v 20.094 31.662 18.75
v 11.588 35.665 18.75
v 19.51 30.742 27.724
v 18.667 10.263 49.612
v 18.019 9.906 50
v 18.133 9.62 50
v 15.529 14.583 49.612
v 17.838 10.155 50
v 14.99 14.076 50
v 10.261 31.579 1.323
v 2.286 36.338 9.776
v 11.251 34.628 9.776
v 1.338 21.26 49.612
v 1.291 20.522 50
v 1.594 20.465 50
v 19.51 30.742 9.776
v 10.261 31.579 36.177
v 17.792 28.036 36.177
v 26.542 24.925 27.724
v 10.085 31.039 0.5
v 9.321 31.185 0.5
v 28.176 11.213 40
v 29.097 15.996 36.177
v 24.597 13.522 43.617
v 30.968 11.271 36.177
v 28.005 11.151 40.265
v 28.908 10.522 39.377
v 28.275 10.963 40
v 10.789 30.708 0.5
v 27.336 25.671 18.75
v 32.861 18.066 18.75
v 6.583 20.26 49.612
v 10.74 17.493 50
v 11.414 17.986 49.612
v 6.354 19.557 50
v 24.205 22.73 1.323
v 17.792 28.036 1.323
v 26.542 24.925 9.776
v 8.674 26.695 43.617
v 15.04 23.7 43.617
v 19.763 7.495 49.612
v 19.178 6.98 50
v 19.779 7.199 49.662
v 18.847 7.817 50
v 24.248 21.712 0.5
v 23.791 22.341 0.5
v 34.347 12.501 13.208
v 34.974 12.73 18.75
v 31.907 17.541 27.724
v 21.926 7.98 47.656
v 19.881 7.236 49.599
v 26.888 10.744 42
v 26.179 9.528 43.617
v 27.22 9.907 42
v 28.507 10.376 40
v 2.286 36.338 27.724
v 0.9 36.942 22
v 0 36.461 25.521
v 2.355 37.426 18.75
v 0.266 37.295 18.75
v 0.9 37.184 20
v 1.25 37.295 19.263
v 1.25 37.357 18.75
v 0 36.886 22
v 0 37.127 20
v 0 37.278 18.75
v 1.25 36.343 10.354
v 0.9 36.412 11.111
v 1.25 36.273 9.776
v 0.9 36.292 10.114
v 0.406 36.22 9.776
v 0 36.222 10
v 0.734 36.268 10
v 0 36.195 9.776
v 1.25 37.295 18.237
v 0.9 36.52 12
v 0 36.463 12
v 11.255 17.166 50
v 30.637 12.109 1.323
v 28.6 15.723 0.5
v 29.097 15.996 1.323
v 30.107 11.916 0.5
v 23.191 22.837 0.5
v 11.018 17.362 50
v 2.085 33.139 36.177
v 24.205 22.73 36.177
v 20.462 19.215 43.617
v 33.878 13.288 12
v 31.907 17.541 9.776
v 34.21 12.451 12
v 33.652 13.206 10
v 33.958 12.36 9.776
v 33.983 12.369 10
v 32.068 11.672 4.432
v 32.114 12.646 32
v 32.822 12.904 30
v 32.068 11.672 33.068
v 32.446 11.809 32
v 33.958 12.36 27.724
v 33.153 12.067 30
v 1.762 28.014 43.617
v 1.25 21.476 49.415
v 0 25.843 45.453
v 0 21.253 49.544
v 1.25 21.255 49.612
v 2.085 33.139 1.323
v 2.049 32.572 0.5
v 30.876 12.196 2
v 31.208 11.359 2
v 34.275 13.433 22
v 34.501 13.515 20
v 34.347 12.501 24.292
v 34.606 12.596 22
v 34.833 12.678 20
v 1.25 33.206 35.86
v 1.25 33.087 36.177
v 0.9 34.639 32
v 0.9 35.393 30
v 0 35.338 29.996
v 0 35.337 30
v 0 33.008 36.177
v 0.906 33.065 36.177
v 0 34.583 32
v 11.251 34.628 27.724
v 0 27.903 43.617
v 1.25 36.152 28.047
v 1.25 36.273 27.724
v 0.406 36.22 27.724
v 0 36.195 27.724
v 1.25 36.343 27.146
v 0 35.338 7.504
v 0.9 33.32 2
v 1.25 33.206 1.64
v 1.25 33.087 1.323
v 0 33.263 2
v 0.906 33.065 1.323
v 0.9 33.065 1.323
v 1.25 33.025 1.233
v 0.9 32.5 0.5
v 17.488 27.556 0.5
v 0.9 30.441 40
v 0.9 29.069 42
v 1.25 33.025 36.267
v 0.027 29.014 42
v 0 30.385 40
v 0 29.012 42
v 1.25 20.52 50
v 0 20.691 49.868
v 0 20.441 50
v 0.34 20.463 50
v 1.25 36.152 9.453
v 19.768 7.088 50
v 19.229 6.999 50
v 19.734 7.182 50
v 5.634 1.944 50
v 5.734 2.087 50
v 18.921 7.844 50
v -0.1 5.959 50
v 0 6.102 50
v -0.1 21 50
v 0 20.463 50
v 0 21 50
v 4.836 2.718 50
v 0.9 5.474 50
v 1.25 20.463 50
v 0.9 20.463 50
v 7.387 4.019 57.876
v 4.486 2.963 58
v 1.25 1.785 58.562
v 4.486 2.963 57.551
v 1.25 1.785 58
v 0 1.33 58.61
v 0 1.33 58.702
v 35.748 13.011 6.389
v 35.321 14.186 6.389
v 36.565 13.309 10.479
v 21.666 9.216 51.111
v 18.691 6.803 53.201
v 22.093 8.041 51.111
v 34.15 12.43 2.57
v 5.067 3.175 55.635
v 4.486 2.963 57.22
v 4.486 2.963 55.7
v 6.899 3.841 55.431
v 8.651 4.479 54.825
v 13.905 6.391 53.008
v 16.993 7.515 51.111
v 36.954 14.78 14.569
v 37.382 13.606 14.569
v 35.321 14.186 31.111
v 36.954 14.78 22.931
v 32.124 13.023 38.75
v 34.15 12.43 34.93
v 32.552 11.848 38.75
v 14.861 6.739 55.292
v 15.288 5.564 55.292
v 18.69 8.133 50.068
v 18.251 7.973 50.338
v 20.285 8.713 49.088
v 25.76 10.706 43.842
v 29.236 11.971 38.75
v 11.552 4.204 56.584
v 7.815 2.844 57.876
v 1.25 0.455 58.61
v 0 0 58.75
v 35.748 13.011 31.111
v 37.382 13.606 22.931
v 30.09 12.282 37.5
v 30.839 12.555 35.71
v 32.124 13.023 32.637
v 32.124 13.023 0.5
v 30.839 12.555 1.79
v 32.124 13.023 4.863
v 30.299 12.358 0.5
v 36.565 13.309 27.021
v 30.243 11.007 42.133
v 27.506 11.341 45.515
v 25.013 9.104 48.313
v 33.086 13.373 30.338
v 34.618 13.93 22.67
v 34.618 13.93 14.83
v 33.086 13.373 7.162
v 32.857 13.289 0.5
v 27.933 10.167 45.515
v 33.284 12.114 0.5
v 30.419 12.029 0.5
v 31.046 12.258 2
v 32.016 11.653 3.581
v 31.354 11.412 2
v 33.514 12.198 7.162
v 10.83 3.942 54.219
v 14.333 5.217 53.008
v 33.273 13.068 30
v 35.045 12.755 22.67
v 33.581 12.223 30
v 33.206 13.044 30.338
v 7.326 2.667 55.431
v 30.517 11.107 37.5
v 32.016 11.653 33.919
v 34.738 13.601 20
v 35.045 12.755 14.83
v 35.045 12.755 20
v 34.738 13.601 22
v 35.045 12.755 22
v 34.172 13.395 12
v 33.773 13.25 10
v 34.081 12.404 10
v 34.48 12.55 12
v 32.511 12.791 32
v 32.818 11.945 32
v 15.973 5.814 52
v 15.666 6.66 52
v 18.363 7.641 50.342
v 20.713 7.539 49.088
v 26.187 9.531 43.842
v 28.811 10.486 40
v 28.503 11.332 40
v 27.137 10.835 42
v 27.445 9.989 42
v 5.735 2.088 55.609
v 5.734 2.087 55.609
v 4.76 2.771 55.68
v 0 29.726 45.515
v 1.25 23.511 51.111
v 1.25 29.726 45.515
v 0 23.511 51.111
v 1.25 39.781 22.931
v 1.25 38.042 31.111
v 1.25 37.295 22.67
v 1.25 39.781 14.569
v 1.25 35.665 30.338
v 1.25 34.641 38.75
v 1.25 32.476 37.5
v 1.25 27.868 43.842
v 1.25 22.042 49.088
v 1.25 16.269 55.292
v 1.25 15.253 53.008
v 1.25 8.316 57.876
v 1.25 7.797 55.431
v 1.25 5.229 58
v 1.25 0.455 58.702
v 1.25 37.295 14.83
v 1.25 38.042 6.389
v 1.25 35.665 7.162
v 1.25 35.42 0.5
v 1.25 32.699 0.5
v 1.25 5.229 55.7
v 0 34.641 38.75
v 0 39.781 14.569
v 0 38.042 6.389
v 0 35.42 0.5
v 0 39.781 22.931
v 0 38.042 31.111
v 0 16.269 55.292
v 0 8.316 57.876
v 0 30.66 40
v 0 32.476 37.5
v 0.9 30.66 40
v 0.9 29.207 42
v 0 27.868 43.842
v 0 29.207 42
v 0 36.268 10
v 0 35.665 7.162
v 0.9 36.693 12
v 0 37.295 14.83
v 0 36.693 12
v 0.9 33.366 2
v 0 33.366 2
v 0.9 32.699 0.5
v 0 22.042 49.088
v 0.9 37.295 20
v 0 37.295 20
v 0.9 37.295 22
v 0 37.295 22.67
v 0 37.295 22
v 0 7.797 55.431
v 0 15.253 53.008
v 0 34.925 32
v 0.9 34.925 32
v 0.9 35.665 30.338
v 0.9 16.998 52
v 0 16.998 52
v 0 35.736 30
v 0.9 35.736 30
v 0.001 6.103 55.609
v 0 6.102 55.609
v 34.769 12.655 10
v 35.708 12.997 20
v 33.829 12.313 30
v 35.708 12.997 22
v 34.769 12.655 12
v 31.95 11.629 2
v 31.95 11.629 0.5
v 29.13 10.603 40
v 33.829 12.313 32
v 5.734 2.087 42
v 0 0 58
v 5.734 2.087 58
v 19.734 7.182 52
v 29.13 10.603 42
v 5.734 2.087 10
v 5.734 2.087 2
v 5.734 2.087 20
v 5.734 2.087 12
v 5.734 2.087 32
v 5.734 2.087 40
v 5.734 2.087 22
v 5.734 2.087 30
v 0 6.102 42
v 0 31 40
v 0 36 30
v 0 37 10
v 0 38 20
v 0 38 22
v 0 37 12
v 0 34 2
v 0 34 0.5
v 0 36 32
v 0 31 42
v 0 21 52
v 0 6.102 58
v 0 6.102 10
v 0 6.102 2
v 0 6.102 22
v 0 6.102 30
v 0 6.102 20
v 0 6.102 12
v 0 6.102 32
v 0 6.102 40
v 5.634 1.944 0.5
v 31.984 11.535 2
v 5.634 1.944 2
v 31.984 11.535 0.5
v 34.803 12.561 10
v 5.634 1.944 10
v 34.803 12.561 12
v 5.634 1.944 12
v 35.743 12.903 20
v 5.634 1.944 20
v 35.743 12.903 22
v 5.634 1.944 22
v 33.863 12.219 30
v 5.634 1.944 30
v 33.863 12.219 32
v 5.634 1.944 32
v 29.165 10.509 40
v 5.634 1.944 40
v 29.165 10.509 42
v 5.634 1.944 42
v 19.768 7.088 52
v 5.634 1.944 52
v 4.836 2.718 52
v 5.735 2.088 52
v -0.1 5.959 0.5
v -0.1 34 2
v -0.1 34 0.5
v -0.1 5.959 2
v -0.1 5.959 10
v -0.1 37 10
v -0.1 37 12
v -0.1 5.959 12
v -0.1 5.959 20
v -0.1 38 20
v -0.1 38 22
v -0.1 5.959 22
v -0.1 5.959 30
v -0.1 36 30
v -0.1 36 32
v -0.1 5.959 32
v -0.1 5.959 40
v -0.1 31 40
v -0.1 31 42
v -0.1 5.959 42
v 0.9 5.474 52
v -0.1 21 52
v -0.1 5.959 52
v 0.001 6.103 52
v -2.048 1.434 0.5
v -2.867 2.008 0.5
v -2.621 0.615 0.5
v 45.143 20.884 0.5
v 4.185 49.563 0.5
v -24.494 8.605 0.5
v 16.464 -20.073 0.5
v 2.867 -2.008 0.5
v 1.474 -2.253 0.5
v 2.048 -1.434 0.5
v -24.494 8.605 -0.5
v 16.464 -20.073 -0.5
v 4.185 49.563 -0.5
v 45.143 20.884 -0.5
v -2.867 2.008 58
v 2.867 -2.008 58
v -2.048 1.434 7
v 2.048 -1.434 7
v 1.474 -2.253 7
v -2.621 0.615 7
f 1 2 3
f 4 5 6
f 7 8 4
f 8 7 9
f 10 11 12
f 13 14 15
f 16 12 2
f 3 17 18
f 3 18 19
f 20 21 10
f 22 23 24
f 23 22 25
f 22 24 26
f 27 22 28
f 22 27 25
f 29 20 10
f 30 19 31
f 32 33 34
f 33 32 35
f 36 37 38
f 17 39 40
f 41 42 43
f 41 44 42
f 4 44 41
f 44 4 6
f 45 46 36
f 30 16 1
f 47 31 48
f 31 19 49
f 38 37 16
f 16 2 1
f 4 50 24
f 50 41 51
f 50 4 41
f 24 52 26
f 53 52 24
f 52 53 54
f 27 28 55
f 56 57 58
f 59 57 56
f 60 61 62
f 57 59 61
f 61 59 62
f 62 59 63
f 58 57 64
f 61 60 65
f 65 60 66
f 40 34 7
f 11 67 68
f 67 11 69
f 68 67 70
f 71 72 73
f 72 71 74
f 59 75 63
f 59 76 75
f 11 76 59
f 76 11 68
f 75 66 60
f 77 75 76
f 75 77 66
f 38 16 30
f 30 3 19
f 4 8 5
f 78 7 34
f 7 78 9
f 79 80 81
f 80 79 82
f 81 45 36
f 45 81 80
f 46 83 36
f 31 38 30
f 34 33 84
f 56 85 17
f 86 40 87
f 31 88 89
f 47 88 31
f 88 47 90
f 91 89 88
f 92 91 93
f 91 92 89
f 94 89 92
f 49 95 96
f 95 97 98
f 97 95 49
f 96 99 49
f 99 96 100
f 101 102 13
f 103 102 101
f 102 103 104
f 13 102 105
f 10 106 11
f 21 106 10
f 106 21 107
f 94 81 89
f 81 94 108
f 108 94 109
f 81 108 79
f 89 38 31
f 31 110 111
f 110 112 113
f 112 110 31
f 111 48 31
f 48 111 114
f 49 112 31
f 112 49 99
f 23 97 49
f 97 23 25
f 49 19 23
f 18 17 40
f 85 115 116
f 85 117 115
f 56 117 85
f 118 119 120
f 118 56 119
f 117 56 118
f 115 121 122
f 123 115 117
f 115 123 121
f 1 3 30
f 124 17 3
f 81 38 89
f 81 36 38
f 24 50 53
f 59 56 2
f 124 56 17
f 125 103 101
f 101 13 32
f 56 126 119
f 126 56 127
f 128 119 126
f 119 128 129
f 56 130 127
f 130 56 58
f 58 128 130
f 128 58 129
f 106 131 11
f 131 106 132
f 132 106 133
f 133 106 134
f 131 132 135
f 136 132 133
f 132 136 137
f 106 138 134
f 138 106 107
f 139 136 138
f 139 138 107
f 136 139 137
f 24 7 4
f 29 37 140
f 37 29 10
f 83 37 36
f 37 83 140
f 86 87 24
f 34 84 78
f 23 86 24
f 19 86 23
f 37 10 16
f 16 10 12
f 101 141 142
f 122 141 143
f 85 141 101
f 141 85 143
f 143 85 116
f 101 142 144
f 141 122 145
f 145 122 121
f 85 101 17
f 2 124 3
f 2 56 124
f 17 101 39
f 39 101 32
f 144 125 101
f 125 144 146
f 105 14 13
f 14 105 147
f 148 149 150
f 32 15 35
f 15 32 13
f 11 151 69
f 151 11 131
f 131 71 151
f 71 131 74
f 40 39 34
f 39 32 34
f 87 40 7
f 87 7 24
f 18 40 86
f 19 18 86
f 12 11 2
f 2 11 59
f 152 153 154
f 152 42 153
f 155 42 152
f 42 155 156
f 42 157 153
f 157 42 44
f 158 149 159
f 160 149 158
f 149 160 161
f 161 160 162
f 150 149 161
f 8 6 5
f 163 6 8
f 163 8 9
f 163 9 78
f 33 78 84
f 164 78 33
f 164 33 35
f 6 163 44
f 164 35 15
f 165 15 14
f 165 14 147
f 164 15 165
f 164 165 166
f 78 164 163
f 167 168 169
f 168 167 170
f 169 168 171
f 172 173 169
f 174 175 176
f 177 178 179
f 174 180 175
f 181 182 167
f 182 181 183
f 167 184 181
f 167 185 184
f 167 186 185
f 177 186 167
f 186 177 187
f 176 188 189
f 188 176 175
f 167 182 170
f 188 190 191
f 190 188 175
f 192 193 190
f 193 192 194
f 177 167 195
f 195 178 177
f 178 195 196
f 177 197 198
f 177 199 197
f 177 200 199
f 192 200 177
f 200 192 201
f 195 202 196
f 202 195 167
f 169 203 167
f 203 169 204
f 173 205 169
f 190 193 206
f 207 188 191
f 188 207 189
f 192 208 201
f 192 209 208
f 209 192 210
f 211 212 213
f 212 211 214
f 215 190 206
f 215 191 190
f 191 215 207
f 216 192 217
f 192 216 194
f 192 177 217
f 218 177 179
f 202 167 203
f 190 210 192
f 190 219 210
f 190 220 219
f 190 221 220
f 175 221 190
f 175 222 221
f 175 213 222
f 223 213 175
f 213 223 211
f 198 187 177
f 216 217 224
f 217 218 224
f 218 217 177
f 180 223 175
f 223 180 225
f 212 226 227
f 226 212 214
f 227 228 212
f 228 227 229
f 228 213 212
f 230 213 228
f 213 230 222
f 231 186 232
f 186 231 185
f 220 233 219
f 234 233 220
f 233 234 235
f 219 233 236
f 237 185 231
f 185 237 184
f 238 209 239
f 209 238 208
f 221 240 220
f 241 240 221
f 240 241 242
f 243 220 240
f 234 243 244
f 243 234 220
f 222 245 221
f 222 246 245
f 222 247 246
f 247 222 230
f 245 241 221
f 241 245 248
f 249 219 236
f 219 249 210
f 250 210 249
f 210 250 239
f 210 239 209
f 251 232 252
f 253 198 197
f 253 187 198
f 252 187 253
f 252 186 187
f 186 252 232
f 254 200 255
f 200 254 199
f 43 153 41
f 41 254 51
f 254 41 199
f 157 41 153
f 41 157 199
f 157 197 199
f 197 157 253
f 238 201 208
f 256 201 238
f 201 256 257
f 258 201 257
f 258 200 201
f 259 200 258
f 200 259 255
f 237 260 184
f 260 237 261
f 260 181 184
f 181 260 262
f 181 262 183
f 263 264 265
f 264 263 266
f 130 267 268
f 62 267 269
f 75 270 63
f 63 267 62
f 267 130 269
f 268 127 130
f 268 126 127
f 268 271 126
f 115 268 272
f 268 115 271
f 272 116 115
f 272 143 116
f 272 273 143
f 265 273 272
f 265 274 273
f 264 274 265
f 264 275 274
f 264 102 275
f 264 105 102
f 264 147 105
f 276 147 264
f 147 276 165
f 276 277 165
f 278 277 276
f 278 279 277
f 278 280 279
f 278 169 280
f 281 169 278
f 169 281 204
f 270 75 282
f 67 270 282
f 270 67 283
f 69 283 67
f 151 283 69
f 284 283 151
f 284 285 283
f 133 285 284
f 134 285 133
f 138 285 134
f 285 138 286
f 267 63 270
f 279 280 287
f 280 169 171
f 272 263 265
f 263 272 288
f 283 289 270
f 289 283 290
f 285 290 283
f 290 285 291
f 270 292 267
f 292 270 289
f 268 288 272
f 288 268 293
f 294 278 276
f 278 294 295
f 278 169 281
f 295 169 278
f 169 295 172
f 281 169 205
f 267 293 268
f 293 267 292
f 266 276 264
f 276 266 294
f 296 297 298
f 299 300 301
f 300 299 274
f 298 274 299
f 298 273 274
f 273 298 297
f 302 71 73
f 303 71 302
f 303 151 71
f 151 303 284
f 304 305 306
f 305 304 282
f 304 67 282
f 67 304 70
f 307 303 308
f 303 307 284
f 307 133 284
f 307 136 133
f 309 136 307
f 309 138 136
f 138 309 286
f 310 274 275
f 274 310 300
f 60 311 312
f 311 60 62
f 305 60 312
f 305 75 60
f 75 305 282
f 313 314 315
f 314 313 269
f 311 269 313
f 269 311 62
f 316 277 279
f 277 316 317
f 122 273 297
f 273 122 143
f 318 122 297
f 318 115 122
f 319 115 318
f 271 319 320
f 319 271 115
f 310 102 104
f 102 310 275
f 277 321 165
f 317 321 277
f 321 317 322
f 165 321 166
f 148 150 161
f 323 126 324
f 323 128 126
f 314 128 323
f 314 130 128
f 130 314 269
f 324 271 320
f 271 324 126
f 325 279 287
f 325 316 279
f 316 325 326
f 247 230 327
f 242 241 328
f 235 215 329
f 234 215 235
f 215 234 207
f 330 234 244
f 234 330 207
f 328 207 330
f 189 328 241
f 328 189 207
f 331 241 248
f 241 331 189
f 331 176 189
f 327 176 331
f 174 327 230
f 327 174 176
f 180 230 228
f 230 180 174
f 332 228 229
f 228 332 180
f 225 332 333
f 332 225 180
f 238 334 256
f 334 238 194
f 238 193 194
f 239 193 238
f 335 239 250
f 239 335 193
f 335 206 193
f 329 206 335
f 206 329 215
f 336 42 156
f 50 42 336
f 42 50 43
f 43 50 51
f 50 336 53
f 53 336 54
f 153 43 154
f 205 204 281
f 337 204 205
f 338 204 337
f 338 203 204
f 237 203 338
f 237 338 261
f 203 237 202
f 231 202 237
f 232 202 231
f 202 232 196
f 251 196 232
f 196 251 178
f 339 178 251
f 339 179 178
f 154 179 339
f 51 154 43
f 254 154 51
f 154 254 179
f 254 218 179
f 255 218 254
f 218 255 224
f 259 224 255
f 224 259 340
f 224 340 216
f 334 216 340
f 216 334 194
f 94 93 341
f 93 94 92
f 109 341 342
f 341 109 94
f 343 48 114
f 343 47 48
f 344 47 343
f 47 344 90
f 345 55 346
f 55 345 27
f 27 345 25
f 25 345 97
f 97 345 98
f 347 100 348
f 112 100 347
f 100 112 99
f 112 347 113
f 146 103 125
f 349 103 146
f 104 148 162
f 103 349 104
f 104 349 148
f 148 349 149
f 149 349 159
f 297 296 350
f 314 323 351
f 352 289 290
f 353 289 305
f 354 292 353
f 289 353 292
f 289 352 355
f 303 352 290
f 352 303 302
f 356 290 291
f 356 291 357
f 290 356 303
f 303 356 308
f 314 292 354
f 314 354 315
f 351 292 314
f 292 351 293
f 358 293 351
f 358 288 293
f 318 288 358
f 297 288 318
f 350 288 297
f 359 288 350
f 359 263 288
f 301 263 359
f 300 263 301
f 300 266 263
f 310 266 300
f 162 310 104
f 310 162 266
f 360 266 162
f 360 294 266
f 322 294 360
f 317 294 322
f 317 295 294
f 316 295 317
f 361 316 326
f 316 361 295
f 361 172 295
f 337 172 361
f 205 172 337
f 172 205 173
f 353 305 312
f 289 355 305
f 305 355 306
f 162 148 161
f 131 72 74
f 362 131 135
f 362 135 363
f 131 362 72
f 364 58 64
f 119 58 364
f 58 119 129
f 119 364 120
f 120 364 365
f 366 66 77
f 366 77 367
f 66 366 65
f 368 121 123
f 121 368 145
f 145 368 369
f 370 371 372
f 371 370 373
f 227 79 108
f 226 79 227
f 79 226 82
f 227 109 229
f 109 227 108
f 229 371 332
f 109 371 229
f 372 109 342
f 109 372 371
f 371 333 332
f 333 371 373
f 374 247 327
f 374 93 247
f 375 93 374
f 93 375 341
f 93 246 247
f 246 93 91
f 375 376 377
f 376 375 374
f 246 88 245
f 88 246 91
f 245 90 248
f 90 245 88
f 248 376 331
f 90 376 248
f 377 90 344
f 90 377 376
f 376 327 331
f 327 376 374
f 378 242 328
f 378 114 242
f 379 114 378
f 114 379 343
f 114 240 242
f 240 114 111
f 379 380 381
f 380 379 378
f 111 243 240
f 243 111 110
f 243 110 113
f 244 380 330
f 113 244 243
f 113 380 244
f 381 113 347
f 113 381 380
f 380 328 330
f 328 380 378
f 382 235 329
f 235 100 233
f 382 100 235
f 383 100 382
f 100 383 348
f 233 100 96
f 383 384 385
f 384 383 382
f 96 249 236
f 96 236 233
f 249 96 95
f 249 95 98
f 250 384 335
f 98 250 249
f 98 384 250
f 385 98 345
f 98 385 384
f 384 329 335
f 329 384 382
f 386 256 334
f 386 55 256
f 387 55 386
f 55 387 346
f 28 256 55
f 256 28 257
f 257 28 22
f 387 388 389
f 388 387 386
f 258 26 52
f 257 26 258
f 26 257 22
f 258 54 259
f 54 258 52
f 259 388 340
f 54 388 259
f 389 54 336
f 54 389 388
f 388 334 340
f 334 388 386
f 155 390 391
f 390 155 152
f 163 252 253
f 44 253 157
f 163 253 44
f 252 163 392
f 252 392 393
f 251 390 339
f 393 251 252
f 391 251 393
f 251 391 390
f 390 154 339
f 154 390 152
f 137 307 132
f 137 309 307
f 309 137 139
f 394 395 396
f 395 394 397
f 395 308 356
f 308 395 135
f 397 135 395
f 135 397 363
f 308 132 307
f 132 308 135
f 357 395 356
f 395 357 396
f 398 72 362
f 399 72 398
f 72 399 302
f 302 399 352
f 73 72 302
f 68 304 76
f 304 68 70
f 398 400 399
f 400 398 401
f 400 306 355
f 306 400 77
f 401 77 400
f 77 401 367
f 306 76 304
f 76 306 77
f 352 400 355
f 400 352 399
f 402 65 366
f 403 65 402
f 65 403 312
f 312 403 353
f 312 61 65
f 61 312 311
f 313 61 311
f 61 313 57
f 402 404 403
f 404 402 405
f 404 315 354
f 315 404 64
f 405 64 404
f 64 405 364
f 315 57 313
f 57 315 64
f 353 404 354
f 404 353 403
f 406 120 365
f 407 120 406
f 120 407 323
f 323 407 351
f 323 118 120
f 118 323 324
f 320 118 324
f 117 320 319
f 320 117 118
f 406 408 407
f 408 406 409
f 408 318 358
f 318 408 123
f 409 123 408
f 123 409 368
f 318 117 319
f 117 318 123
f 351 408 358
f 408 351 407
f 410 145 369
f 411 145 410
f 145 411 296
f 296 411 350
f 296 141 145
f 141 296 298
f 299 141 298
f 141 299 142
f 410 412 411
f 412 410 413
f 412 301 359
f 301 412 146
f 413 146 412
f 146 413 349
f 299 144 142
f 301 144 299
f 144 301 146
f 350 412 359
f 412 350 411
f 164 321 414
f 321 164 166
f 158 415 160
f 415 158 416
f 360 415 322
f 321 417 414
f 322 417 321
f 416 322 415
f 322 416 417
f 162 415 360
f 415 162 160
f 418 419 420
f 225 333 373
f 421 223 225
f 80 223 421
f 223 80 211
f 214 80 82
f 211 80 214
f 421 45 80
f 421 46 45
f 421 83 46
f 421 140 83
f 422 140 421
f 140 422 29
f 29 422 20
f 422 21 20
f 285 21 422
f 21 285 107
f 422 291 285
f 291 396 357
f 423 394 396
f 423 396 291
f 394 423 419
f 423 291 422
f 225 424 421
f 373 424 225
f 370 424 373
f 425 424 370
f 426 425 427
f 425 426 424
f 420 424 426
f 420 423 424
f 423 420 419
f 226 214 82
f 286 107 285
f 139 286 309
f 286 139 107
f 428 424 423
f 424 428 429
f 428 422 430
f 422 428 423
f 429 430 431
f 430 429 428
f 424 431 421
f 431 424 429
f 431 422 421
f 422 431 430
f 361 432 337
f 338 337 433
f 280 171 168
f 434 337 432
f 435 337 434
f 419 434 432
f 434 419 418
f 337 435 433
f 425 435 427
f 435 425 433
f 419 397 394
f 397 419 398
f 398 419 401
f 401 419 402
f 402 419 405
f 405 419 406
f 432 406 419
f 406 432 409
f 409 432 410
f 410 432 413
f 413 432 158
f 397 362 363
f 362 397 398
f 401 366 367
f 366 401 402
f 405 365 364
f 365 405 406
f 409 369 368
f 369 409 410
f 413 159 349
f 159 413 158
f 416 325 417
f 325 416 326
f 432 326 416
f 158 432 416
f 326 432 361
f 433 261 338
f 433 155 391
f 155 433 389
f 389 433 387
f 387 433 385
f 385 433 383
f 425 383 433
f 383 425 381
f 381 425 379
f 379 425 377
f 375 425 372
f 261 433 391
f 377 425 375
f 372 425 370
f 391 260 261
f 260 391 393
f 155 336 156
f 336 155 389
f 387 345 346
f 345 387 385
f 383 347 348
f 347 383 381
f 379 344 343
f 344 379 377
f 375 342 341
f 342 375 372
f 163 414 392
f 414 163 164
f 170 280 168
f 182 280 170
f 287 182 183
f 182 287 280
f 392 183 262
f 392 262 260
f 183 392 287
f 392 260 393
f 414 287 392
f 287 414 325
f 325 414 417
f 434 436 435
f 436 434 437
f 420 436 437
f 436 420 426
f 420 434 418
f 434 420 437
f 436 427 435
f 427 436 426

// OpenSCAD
sphere_radius=30;
boundry_wall_radius=sphere_radius+2;

cube_side=100;

scale_by=1.25;

//40x40x57


scale([scale_by,scale_by,scale_by]){
difference(){
	
	union(){

		difference(){
			translate([0,0,15])
				sphere(r=sphere_radius,$fn=25);

			translate([cube_side/-2,cube_side/-2,sphere_radius*5/6+15])
				color("red")		// above the roof
					cube([cube_side,cube_side,cube_side]);
		}

		difference(){
			rotate([90,90,20])
				translate([-15,0,0])
					color("white")
						cylinder(r=boundry_wall_radius,h=2,center=true);
			rotate([90,90,20])
				translate([-15,0,0])
					color("white")
						cylinder(r=boundry_wall_radius-2,h=4,center=true);
		}

		difference(){
			rotate([90,90,90])
				translate([-15,0,0])
					color("purple")
						cylinder(r=boundry_wall_radius,h=2,center=true);
			rotate([90,90,90])
				translate([-15,0,0])
					color("purple")
						cylinder(r=boundry_wall_radius-2,h=4,center=true);
		}
	}

	union(){		
		rotate([0,0,20])
			translate([0,cube_side/-2,0])
				color("blue")
					cube([cube_side,cube_side,cube_side],center=true);

		rotate([0,0,0])
			translate([cube_side/-2,0,0])
				color("blue")
					cube([cube_side,cube_side,cube_side],center=true);

		translate([cube_side/-2,cube_side/-2,-cube_side])
			color("red")		// Below the ground
				cube([cube_side,cube_side,cube_side]);


	}
}

}

		color("green")
			rotate([0,0,45+10])
			translate([18,0,0])
				cube([50,50,1],center=true);

	//The corner wall
		color("yellow")
			rotate([0,0,45+10])
				translate([0,-3.5,0])
					cube([5,7,sphere_radius+28]);

	// Door
		color("blue")
			rotate([0,0,45+10])
				translate([-1,-2.5,0])
					cube([2,5,7]);


// 40 foot marker
			color("red")
			rotate([0,0,0])
				translate([-6,0,0])
		;//			cube([5,40,sphere_radius+16.5]);
	
					
	//Wall stripes
		color("white")
			rotate([90,90,20]){
				translate([-2,1,-.9])
						cube([2,33,1]);
				translate([-12,1,-.9])
						cube([2,36,1]);
				translate([-22,1,-.9])
						cube([2,37,1]);
				translate([-32,1,-.9])
						cube([2,35,1]);
				translate([-42,1,-.9])
						cube([2,30,1]);
				translate([-52,1,-.9])
						cube([2,20,1]);
			}

		color("white")
			rotate([90,90,90]){
				translate([-2,1,-.1])
						cube([2,33,1]);
				translate([-12,1,-.1])
						cube([2,36,1]);
				translate([-22,1,-.1])
						cube([2,37,1]);
				translate([-32,1,-.1])
						cube([2,35,1]);
				translate([-42,1,-.1])
						cube([2,30,1]);
				translate([-52,1,-.1])
						cube([2,20,1]);
			}
